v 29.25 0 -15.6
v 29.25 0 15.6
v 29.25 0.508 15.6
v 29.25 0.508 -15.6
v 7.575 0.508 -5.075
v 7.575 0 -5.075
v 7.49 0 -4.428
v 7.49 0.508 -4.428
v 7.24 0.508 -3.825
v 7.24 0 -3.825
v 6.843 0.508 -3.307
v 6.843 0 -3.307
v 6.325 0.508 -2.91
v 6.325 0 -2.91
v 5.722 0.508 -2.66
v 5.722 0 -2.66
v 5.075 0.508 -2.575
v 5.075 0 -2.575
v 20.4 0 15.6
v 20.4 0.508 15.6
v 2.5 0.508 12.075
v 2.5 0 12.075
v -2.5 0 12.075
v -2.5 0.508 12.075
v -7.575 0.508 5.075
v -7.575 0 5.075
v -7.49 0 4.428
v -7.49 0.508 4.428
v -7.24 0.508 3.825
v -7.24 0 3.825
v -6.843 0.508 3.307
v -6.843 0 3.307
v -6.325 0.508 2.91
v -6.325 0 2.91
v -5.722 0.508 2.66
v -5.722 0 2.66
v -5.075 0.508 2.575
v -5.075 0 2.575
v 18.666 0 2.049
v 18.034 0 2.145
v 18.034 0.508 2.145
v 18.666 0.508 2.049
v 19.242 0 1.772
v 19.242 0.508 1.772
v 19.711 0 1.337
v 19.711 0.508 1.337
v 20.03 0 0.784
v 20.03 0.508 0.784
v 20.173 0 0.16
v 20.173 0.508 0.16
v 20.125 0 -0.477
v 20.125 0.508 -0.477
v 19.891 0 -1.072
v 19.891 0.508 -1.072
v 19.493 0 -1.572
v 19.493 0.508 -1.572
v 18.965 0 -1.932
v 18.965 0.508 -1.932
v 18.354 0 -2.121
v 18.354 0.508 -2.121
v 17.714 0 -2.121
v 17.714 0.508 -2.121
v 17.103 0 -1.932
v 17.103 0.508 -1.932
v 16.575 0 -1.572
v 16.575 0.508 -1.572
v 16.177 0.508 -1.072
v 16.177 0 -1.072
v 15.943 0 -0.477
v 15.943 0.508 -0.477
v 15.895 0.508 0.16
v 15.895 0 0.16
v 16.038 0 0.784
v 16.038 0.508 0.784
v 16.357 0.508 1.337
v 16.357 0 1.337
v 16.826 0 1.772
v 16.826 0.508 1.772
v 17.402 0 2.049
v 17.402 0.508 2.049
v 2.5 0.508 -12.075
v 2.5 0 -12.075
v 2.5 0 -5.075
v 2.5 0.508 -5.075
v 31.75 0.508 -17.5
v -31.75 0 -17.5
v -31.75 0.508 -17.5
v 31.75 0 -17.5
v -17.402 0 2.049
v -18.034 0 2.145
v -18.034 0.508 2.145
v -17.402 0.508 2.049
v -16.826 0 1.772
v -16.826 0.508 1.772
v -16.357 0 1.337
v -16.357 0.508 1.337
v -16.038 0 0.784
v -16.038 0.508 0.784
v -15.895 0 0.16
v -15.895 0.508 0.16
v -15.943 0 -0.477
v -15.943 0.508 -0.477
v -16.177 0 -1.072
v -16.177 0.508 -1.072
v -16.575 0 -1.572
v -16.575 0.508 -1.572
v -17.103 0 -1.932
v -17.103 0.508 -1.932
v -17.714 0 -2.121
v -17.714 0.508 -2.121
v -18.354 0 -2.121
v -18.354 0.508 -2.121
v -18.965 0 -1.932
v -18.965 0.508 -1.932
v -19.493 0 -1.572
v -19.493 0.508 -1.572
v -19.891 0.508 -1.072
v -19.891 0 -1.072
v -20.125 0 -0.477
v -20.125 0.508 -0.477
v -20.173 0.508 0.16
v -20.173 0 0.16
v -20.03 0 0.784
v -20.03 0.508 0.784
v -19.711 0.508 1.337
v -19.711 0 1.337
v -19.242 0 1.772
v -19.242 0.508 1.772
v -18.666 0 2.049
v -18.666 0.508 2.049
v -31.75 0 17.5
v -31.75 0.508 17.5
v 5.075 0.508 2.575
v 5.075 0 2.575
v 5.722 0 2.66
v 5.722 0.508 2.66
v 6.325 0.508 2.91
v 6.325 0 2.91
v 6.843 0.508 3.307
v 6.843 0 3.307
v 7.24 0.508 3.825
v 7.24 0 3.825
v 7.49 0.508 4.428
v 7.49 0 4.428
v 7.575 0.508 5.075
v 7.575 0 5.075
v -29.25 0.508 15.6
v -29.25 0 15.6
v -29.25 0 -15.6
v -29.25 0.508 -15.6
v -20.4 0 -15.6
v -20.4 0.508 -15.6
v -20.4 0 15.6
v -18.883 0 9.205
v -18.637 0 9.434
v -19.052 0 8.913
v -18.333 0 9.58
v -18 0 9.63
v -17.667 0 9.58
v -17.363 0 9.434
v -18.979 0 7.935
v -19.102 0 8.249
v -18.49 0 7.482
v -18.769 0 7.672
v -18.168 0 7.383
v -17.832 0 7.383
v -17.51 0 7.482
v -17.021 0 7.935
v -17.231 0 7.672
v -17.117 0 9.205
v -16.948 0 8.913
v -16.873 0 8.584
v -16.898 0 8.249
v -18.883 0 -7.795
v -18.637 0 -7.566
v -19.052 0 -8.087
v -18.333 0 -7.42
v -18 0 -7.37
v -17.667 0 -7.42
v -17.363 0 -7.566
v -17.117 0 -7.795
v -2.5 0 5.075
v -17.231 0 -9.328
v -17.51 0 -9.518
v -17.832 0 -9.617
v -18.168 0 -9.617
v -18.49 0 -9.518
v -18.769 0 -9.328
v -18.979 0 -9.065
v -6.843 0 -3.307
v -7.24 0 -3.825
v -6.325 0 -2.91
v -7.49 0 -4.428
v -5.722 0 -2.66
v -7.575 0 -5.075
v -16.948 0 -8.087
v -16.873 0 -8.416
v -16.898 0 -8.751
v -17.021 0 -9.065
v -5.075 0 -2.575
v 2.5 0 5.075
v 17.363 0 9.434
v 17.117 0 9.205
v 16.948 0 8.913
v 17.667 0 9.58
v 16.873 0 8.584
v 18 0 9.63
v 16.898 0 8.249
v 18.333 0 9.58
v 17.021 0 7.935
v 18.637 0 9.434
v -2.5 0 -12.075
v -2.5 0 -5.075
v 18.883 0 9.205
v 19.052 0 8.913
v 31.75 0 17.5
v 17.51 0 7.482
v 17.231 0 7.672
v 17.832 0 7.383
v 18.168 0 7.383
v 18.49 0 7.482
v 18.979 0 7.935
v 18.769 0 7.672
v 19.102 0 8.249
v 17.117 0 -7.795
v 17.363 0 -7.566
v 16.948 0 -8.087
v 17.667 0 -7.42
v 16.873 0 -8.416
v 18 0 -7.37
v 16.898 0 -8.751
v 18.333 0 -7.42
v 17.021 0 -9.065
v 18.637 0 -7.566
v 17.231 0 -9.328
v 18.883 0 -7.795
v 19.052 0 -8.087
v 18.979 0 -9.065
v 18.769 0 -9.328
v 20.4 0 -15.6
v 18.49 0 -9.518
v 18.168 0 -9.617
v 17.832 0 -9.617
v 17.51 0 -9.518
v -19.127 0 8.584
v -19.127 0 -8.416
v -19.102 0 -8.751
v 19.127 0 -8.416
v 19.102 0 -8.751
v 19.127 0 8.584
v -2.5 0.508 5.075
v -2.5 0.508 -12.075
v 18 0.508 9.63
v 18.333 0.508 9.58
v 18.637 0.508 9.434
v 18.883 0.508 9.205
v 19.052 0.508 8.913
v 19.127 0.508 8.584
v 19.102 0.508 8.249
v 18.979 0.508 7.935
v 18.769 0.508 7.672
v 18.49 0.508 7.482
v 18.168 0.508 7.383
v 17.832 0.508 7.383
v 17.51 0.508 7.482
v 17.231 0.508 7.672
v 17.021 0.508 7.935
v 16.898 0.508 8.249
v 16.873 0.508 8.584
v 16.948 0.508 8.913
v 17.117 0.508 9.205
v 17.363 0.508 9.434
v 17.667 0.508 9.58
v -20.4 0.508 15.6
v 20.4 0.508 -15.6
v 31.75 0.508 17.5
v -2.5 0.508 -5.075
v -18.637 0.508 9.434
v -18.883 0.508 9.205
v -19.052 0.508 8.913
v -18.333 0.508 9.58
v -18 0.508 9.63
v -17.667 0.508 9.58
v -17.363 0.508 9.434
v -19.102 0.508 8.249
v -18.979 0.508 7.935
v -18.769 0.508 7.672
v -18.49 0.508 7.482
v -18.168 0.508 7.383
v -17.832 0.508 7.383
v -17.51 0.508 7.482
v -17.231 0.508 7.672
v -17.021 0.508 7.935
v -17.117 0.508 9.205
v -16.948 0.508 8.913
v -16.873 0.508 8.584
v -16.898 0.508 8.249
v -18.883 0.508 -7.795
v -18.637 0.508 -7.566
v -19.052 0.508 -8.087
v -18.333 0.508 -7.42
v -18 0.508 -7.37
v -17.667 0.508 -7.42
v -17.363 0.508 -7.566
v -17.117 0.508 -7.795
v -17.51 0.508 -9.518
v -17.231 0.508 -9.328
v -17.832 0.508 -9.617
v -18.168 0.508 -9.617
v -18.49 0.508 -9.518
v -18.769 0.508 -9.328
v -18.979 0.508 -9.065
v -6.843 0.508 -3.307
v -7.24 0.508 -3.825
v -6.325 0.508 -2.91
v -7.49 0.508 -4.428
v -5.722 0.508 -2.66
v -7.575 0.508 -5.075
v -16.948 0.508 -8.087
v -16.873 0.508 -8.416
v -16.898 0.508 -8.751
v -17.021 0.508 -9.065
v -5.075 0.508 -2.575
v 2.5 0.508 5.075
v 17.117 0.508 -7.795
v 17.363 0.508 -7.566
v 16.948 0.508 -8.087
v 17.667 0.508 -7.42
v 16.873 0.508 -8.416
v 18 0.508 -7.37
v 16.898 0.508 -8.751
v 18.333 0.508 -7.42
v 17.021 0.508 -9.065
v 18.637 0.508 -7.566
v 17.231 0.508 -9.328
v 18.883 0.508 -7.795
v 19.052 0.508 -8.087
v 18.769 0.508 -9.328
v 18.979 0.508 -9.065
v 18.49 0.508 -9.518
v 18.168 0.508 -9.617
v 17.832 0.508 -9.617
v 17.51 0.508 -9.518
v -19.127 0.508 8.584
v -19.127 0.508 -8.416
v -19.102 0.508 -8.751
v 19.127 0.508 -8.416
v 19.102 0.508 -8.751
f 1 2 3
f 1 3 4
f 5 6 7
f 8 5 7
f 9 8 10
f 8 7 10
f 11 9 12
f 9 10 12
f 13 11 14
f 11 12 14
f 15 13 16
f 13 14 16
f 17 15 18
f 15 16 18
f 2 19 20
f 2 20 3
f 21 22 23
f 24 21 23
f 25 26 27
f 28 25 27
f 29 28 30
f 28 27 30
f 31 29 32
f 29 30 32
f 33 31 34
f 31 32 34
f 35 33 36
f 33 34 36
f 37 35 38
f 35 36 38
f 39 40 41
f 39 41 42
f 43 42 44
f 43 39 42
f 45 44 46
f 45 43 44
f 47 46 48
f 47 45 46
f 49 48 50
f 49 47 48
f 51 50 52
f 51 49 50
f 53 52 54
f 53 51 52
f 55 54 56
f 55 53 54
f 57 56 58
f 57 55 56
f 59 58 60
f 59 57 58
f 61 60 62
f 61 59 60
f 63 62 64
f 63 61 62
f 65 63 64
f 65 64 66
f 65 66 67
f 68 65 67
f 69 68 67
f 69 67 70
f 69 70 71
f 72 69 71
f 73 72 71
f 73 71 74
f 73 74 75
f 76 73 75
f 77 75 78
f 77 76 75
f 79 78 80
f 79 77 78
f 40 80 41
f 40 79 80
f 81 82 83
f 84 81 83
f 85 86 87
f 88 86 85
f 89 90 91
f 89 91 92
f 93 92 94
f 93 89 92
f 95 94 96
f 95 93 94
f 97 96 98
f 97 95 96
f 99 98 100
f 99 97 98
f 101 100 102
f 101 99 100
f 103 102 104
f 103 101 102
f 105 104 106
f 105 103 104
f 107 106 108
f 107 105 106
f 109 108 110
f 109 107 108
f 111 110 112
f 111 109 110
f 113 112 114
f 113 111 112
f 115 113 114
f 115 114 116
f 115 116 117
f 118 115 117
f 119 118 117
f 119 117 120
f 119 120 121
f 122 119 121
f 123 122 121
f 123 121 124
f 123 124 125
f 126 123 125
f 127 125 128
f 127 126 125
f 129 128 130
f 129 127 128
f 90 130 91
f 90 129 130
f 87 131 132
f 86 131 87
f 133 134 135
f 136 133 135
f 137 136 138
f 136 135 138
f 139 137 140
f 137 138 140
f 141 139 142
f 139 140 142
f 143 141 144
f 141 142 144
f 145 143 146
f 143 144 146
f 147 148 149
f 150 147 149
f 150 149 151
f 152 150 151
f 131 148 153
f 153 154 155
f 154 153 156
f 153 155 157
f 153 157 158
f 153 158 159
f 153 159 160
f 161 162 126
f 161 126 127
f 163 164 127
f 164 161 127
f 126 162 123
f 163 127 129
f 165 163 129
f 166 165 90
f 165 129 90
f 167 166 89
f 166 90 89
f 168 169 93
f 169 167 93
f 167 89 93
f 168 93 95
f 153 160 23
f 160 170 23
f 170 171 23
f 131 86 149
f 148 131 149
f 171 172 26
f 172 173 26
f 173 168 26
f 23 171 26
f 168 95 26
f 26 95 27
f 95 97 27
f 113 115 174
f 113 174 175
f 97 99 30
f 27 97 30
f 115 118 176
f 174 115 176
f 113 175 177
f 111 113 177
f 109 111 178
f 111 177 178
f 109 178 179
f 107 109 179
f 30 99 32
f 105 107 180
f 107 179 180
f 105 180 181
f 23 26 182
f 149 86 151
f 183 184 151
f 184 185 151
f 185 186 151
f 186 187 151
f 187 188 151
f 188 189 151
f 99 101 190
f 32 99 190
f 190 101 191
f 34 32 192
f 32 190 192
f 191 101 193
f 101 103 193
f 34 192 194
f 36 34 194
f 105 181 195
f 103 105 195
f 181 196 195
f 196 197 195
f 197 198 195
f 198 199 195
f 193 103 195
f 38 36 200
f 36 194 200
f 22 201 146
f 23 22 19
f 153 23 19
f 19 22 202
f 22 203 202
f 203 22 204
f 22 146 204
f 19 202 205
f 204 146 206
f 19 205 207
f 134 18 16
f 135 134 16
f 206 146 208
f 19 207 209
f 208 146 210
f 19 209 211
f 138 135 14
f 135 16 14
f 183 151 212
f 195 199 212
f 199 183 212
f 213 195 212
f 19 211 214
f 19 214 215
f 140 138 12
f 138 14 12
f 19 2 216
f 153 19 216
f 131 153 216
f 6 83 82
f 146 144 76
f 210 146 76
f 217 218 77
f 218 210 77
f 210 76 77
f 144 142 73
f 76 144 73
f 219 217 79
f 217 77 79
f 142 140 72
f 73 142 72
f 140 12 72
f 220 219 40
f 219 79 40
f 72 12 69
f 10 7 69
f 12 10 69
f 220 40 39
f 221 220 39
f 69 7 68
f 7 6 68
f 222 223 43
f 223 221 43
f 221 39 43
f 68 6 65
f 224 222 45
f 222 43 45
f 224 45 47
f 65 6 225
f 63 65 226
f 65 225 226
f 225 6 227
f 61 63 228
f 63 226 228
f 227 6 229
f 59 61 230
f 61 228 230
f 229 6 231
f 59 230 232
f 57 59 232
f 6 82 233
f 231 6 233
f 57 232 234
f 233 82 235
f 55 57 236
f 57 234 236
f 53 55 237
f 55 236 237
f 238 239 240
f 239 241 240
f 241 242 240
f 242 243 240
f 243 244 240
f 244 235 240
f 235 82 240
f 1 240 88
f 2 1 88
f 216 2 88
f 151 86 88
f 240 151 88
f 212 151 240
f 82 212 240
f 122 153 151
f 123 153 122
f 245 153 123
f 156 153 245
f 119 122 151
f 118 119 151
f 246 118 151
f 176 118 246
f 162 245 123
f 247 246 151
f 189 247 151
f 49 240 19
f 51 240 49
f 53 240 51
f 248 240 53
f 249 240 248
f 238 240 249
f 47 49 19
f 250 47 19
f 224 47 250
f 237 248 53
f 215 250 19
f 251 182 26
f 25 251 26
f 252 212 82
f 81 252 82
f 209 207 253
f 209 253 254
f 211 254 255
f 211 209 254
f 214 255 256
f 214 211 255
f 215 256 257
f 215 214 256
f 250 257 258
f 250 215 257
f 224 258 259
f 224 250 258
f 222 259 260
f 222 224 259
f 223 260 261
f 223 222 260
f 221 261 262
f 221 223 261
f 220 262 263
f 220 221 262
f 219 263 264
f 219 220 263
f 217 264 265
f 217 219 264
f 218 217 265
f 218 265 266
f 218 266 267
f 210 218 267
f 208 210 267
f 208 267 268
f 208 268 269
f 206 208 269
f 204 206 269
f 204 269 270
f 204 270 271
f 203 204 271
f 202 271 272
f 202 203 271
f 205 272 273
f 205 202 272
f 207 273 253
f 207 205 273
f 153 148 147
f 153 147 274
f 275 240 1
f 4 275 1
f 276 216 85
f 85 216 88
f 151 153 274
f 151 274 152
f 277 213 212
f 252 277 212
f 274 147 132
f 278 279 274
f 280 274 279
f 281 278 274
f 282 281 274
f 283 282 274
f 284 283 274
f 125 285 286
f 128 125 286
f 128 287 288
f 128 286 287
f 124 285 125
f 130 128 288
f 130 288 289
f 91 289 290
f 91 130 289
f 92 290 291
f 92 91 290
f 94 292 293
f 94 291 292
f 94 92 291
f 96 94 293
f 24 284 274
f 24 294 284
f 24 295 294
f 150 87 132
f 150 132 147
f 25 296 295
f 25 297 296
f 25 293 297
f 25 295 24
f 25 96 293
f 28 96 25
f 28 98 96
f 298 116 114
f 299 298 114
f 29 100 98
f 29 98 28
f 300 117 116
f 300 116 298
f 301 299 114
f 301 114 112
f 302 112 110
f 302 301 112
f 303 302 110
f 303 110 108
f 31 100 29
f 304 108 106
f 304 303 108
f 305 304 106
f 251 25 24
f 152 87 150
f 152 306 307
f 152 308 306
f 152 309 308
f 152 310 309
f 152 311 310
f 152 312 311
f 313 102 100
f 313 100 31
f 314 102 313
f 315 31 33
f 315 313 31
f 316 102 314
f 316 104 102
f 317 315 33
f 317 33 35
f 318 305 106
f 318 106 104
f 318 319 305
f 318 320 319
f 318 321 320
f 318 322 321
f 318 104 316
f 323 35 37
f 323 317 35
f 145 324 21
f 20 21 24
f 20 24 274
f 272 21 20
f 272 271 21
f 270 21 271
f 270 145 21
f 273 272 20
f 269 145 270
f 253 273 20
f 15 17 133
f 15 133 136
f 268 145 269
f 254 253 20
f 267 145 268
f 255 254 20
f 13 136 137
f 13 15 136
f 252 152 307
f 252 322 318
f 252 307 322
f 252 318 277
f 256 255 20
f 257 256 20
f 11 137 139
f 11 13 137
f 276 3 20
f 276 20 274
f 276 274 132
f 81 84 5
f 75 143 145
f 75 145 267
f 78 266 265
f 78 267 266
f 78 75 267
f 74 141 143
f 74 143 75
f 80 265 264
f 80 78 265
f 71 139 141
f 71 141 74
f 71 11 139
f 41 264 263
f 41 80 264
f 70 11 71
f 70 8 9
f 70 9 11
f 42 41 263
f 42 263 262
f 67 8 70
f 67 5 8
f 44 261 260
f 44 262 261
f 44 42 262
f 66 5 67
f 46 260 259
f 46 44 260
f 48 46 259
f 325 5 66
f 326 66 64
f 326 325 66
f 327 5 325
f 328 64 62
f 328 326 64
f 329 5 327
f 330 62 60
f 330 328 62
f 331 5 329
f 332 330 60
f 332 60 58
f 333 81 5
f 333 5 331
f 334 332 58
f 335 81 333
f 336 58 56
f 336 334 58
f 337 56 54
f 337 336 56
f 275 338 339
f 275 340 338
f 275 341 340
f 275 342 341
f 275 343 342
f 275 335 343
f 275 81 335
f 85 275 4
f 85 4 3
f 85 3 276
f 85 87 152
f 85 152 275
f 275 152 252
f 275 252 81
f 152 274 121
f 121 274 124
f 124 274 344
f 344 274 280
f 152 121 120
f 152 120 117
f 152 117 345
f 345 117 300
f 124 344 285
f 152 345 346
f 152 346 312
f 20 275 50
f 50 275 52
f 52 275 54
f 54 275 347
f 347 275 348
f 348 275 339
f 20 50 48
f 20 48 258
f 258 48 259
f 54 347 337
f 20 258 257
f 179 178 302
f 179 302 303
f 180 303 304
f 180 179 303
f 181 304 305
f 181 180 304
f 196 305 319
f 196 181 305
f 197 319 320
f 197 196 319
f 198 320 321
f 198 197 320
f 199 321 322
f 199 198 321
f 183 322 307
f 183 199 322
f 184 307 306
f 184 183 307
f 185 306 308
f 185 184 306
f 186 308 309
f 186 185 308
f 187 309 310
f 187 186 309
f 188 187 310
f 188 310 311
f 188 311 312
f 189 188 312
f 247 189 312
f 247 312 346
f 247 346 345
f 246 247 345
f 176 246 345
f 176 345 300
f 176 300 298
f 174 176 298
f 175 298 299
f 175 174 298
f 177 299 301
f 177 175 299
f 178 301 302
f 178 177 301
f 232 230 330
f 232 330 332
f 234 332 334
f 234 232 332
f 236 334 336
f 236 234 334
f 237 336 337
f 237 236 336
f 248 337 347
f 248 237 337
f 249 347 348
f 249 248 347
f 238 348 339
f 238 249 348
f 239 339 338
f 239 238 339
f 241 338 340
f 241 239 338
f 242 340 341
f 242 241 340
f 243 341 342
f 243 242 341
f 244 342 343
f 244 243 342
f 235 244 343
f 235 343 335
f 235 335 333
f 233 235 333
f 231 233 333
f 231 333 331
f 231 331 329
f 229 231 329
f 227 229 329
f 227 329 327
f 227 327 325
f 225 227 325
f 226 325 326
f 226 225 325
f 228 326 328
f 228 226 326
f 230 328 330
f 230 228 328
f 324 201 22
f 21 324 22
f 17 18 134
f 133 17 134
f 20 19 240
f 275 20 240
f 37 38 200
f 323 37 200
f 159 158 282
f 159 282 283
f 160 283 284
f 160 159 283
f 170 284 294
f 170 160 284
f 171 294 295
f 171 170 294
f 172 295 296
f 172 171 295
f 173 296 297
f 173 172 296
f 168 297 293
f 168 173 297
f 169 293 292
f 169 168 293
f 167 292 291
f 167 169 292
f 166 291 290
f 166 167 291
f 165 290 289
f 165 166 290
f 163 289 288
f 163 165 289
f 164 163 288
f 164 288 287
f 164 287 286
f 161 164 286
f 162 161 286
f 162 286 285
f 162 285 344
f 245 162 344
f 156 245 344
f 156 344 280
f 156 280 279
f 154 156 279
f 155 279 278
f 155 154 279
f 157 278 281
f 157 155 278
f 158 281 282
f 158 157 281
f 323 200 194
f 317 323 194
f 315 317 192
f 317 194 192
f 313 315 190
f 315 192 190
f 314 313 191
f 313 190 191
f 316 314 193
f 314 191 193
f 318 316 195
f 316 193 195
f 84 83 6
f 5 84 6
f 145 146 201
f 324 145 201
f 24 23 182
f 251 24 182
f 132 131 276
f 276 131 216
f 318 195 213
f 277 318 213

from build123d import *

# Parameters (mm, degrees)
SKETCH1_W           = 63.5
SKETCH1_H           = 35
SKETCH1_R           = 1.13
SKETCH1_W_2         = 8.85
SKETCH1_H_2         = 31.2
SKETCH1_R_2         = 2.144603346
BOSS_EXTRUDE1_DEPTH = 0.508


with BuildPart() as part:
    # Sketch1 → Boss-Extrude1 (new body)
    with BuildSketch(Plane(origin=(0, 0, 0), x_dir=(1, 0, 0), z_dir=(0, 1, 0))):
        Rectangle(SKETCH1_W, SKETCH1_H)
        with BuildLine():
            Line((-2.5, 5.075), (-2.5, 12.075))
            Line((-2.5, 12.075), (2.5, 12.075))
            Line((2.5, 12.075), (2.5, 5.075))
            Line((2.5, 5.075), (7.575, 5.075))
            ThreePointArc((7.575, 5.075), (6.842766953, 3.307233047), (5.075, 2.575))
            Line((5.075, 2.575), (5.075, -2.575))
            ThreePointArc((5.075, -2.575), (6.842766953, -3.307233047), (7.575, -5.075))
            Line((7.575, -5.075), (2.5, -5.075))
            Line((2.5, -5.075), (2.5, -12.075))
            Line((2.5, -12.075), (-2.5, -12.075))
            Line((-2.5, -12.075), (-2.5, -5.075))
            Line((-2.5, -5.075), (-7.575, -5.075))
            ThreePointArc((-7.575, -5.075), (-6.842766953, -3.307233047), (-5.075, -2.575))
            Line((-5.075, -2.575), (-5.075, 2.575))
            ThreePointArc((-5.075, 2.575), (-6.842766953, 3.307233047), (-7.575, 5.075))
            Line((-7.575, 5.075), (-2.5, 5.075))
        make_face(mode=Mode.SUBTRACT)
        with Locations(Location((-18, -8.5, 0), (0, 0, 270))):
            Circle(SKETCH1_R, mode=Mode.SUBTRACT)
        with Locations(Location((18, -8.5, 0), (0, 0, 270))):
            Circle(SKETCH1_R, mode=Mode.SUBTRACT)
        with Locations((-24.825, 0)):
            Rectangle(SKETCH1_W_2, SKETCH1_H_2, mode=Mode.SUBTRACT)
        with Locations(Location((-18.034, 0, 0), (0, 0, 270))):
            Circle(SKETCH1_R_2, mode=Mode.SUBTRACT)
        with Locations(Location((-18, 8.5, 0), (0, 0, 270))):
            Circle(SKETCH1_R, mode=Mode.SUBTRACT)
        with Locations(Location((18, 8.5, 0), (0, 0, 270))):
            Circle(SKETCH1_R, mode=Mode.SUBTRACT)
        with Locations((24.825, 0)):
            Rectangle(SKETCH1_W_2, SKETCH1_H_2, mode=Mode.SUBTRACT)
        with Locations(Location((18.034, 0, 0), (0, 0, 270))):
            Circle(SKETCH1_R_2, mode=Mode.SUBTRACT)
    extrude(amount=BOSS_EXTRUDE1_DEPTH)


solid = part.part
